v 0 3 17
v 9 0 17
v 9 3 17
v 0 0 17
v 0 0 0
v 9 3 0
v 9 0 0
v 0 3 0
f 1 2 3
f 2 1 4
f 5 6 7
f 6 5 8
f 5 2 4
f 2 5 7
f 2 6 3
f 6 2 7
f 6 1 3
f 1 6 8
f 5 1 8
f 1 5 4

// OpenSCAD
// Generated by SolidPython 1.0.1 on 2020-07-29 00:46:55


cube(size = [9, 3, 17]);
/***********************************************
*********      SolidPython code:      **********
************************************************
 
# import packages: SolidPython
from solid import *
from solid.utils import *
from itertools import chain, combinations, permutations


class Resize:

    def __init__(self, scad_file):
        self.scad_file = scad_file
        #self.scad_file = import_scad(scad_file)
        # cone/cylinder param:
        self.r1 = 0
        self.r2 = 0
        self.h = 0
        # rectangular prism param:
        self.w = 0
        self.l = 0
        # ellipse param:
        self.r = 0

    # import OpenScad code (file name corresponds to shape)


    # classify shape + parameters
    def assign(self, param1, param2, param3):
        if self.scad_file == 'cone.scad':
            self.r1 = param1
            self.r2 = param2
            self.h = param3
        elif self.scad_file == 'cylinder.scad':
            self.r1 = param1
            self.r2 = param2
            self.h = param3
        elif self.scad_file == 'rectangularPrism.scad':
            self.h = param1
            self.l = param2
            self.w = param3
        else:
            self.r = param1
            self.h = param2

    # resize parameters
    def iterate(self):
        x = range(3, 20, 2)
        i = 1
        if self.scad_file == 'cone.scad':
            tempList = list(permutations(x, 2))
            for temp in tempList:
                param1 = temp[0]
                param2 = temp[1]
                filepath = 'produced_scad_files/' + 'cone' + str(param1) + '_' + str(param2) + '_' + '.scad'
                scad_render_to_file(cylinder(h=param1, r1=param2, r2=0), filepath)

        elif self.scad_file == 'cylinder.scad':
            tempList = list(permutations(x, 3))
            for temp in tempList:
                param1 = temp[0]
                param2 = temp[1]
                filepath = 'produced_scad_files/' + 'cylinder' + str(param1) + '_' + str(param2) + '_' + '.scad'
                scad_render_to_file(cylinder(h=param1, r1=param2, r2=param2), filepath)

        elif self.scad_file == 'rectangularPrism.scad':
            tempList = list(permutations(x, 3))
            for temp in tempList:
                param1 = temp[0]
                param2 = temp[1]
                param3 = temp[2]
                filepath = 'produced_scad_files/' + 'rectangularPrism' + str(param1) + '_' + str(param2) + '_' + str(
                    param3) + '.scad'
                scad_render_to_file(cube(size=(param1, param2, param3)), filepath)

        elif self.scad_file == 'ellipse.scad':
            tempList = list(permutations(x, 4))
            for temp in tempList:
                param1 = temp[0]
                param2 = temp[1]
                param3 = temp[2]
                param4 = temp[3]
                filepath = 'produced_scad_files/' + 'ellipse' + str(param1) + '_' + str(param2) + '_' + str(param3) + '_' + str(param4) + '.scad'
                scad_render_to_file(scale([param1, param2, param3])(sphere(r=param4)), filepath)

    def render_to_scadfile(self):
        scad_render_to_file(scad, 'example.scad') 
 
************************************************/
